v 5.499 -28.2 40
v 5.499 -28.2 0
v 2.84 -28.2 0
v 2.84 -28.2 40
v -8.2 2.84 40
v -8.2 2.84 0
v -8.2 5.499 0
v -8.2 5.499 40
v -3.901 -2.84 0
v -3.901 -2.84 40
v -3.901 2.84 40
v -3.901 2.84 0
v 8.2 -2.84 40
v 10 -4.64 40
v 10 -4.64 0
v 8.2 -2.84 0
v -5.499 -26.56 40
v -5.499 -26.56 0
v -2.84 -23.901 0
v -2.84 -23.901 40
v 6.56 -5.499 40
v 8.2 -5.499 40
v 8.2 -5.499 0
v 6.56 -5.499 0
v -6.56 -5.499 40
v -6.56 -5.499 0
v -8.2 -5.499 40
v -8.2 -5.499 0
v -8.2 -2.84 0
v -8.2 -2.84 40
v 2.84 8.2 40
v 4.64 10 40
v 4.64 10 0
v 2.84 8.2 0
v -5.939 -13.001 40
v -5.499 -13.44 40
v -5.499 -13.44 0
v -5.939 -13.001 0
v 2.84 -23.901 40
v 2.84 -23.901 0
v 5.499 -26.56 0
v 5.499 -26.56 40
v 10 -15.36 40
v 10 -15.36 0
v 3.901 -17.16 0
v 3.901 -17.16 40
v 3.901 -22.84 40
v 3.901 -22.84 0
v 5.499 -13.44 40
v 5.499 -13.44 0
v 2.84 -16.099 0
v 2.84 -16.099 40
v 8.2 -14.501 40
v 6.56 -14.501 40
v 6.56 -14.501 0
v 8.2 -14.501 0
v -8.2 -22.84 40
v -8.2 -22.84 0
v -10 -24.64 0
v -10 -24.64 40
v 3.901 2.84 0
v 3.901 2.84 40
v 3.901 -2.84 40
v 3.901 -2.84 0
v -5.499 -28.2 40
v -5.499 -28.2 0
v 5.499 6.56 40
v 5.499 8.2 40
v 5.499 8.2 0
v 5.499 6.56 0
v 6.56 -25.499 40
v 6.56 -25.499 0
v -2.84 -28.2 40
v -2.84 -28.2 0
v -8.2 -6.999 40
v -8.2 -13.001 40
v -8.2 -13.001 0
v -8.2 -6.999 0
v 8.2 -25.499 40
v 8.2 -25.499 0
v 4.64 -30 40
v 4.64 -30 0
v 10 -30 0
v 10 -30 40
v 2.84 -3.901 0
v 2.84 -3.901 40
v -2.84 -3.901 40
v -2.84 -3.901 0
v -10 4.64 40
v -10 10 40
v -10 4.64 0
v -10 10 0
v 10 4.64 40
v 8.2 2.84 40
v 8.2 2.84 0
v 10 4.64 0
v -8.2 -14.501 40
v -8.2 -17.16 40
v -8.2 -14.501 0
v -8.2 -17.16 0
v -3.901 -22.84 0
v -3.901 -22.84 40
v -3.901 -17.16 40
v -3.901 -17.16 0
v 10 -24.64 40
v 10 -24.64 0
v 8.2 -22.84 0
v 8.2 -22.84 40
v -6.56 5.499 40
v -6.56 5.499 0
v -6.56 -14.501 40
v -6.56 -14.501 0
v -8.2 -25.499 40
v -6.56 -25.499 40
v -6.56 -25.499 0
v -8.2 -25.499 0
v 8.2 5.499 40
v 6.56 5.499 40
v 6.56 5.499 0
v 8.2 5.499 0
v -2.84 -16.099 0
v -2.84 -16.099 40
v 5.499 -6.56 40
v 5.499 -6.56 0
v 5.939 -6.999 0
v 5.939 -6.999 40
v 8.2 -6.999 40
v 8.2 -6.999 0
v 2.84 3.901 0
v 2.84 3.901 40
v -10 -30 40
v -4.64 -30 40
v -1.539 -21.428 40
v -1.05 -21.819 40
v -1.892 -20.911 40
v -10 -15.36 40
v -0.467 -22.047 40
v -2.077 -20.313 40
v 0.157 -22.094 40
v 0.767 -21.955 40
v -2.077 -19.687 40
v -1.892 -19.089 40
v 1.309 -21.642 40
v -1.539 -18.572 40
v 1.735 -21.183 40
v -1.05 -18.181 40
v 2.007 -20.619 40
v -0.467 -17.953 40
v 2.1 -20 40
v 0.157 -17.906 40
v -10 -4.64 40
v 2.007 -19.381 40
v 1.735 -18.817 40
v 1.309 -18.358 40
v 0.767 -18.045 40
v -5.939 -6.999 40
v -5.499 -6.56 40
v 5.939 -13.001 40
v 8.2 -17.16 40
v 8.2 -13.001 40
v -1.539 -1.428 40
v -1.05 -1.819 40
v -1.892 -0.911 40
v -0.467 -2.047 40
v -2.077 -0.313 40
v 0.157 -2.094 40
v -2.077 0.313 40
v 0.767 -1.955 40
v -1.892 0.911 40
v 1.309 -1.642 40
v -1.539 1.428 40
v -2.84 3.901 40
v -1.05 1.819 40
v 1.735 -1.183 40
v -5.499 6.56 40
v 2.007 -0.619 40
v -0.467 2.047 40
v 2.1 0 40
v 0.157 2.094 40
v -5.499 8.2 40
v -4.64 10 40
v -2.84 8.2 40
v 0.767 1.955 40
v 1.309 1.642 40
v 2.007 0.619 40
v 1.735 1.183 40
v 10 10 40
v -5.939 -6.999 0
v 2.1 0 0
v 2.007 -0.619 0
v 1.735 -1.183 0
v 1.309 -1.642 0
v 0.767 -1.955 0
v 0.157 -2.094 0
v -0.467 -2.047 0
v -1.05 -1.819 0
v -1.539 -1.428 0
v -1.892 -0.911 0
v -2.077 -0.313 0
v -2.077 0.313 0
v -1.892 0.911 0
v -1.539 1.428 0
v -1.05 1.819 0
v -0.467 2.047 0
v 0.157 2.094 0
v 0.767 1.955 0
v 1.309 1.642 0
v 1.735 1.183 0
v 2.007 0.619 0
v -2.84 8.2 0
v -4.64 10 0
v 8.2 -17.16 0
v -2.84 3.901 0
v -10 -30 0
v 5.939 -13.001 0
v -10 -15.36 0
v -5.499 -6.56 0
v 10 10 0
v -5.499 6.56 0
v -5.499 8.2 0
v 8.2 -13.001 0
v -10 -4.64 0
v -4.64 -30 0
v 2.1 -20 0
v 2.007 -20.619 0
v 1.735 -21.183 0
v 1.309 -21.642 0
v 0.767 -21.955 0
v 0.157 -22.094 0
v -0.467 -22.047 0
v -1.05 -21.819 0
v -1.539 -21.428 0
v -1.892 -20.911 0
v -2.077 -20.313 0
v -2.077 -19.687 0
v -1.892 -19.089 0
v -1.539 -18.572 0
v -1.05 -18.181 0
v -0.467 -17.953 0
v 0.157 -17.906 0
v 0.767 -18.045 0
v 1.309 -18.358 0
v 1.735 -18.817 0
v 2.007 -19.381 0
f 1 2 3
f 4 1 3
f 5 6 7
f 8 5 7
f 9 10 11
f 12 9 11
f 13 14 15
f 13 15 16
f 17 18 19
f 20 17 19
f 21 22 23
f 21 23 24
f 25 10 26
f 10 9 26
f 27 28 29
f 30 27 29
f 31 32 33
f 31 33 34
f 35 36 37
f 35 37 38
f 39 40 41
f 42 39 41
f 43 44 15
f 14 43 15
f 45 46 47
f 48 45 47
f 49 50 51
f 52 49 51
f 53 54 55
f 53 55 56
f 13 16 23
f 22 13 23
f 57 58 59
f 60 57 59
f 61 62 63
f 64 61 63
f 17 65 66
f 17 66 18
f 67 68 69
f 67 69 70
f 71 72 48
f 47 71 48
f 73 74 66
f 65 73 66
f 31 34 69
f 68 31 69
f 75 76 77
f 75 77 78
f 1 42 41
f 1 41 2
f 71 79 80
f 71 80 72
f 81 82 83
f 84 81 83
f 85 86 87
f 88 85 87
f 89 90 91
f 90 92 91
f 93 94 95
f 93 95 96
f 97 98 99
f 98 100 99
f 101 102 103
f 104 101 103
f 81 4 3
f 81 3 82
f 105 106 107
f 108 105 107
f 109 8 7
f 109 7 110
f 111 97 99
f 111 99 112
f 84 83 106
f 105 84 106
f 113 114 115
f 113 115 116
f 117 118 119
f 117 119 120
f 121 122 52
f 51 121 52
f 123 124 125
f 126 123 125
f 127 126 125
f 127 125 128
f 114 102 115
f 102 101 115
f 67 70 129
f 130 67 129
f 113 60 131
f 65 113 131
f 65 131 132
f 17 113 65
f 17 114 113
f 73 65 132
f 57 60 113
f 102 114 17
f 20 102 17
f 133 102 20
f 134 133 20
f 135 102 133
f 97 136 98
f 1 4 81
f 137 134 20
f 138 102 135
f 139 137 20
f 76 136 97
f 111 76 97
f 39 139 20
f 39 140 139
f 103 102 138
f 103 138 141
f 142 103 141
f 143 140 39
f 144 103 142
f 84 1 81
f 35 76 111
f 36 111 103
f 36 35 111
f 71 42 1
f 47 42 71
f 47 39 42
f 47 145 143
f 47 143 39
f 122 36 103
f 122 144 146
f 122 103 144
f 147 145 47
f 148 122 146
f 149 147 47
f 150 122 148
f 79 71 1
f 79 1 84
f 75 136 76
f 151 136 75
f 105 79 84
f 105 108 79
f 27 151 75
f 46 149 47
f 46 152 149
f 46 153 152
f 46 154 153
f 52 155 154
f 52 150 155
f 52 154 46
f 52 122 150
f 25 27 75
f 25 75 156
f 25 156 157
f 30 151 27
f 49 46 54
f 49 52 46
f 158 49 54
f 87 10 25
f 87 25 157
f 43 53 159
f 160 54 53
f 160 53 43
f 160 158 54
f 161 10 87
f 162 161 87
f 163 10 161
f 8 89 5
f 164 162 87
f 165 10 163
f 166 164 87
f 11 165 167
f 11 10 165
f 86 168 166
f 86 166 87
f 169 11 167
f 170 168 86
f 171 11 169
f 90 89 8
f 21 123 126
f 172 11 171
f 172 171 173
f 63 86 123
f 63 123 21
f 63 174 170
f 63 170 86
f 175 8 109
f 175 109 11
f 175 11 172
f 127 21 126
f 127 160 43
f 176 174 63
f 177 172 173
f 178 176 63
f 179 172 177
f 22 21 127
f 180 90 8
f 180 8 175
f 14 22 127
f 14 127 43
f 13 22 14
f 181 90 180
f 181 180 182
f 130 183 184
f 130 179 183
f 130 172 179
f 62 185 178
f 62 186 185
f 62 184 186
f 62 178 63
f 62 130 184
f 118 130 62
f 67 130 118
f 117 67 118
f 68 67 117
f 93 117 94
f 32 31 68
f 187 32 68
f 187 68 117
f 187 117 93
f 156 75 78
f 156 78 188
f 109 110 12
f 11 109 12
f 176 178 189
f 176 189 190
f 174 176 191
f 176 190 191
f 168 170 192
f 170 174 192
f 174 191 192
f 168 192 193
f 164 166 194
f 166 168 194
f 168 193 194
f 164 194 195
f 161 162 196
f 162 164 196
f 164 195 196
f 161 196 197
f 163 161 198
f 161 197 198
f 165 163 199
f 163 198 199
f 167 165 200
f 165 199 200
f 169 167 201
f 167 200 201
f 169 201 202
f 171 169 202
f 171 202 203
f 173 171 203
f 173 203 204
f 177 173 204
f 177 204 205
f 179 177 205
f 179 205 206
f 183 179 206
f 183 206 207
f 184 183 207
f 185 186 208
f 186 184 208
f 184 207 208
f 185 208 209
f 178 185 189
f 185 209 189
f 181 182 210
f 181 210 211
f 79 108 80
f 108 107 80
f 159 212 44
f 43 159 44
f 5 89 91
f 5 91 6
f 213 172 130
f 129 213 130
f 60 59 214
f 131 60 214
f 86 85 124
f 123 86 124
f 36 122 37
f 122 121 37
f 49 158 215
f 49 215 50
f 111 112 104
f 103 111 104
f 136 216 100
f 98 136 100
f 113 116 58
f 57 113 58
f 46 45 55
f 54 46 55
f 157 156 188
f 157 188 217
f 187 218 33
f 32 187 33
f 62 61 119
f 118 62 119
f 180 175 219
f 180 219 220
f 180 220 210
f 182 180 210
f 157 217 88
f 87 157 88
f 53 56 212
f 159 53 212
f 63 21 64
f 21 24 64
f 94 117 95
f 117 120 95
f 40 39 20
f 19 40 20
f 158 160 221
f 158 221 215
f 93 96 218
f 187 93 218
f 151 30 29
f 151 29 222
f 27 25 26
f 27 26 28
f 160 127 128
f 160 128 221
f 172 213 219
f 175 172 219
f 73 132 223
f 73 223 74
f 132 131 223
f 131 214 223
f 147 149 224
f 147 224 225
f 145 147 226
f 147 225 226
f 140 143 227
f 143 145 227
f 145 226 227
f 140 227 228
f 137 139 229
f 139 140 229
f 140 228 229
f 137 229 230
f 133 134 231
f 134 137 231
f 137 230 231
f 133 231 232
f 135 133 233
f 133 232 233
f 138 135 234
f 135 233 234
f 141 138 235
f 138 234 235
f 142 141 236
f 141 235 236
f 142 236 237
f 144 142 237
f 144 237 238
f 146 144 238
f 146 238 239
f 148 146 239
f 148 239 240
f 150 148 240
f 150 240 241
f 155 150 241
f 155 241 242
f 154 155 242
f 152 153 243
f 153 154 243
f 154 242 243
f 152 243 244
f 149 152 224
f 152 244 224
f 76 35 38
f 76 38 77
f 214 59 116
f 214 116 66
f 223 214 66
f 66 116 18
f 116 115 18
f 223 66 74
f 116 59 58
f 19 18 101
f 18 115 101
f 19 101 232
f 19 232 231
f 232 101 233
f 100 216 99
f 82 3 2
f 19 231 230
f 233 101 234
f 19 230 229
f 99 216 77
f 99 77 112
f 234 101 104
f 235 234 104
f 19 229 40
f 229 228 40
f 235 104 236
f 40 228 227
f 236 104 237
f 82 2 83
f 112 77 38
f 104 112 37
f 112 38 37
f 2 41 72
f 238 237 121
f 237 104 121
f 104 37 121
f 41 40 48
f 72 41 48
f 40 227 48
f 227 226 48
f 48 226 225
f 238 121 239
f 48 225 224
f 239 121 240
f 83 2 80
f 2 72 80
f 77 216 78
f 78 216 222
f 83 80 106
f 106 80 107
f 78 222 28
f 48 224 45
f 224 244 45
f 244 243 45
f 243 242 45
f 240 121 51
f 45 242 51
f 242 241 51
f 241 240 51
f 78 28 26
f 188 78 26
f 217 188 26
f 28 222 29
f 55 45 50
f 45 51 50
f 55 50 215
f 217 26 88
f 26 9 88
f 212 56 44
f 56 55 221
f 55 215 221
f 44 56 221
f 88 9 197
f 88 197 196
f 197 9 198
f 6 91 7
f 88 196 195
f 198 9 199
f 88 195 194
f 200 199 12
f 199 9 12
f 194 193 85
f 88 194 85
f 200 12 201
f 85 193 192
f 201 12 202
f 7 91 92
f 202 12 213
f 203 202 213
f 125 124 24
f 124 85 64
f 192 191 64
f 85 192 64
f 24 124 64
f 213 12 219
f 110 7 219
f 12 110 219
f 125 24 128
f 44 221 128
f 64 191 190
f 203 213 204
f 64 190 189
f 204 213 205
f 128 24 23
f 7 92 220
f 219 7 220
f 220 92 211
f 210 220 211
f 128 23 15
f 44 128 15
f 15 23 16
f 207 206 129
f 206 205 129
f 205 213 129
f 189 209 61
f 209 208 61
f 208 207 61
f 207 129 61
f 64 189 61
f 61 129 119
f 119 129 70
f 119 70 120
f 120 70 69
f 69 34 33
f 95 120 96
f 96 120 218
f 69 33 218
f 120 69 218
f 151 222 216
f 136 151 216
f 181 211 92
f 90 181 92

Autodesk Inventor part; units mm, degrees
ref_plane "YZ Plane" through (0, 0, 0) normal (1, 0, 0) x (0, 1, 0)
ref_plane "XY Plane" through (0, 0, 0) normal (0, 0, 1) x (1, 0, 0)
sketch "Sketch1" plane through (0, 0, 0) normal (0, 0, 1) x (1, 0, 0)
  line L0 (-3.9007, 3.9007) -> (3.9007, 3.9007)
  line L1 (3.9007, 3.9007) -> (3.9007, -3.9007)
  line L2 (3.9007, -3.9007) -> (-3.9007, -3.9007)
  line L3 (-3.9007, -3.9007) -> (-3.9007, 3.9007)
  line L4 (0, 3.9007) -> (0, -3.9007) construction
  line L5 (-3.9007, 0) -> (3.9007, 0) construction
  circle A0 centre (0, 0) radius 2.1
  line L6 (0, 0) -> (-16.1173, 16.1173) construction
  line L7 (0, 0) -> (22.7933, 0) construction
  line L8 (-2.84, 3.9007) -> (-5.4993, 6.56)
  line L9 (-5.4993, 6.56) -> (-5.4993, 8.2)
  line L10 (-5.4993, 8.2) -> (-2.84, 8.2)
  line L11 (-2.84, 8.2) -> (-4.64, 10)
  line L12 (-4.64, 10) -> (-10, 10)
  line L13 (-10, 10) -> (-10, 4.64)
  line L14 (-10, 4.64) -> (-8.2, 2.84)
  line L15 (-8.2, 2.84) -> (-8.2, 5.4993)
  line L16 (-8.2, 5.4993) -> (-6.56, 5.4993)
  line L17 (-6.56, 5.4993) -> (-3.9007, 2.84)
  line L18 (-3.9007, 2.84) -> (-11.3102, 2.84) construction
  line L19 (-2.84, 3.9007) -> (-3.9007, 3.9007)
  line L20 (-3.9007, 2.84) -> (-3.9007, 3.9007)
  line L21 (-3.9007, -2.84) -> (-6.56, -5.4993)
  line L22 (-6.56, -5.4993) -> (-8.2, -5.4993)
  line L23 (-8.2, -5.4993) -> (-8.2, -2.84)
  line L24 (-8.2, -2.84) -> (-10, -4.64)
  line L25 (-10, -4.64) -> (-10, -10)
  line L26 (-10, -10) -> (-4.64, -10)
  line L27 (-4.64, -10) -> (-2.84, -8.2)
  line L28 (-2.84, -8.2) -> (-5.4993, -8.2)
  line L29 (-5.4993, -8.2) -> (-5.4993, -6.56)
  line L30 (-5.4993, -6.56) -> (-2.84, -3.9007)
  line L31 (-3.9007, -2.84) -> (-3.9007, -3.9007)
  line L32 (-2.84, -3.9007) -> (-3.9007, -3.9007)
  line L33 (2.84, -3.9007) -> (5.4993, -6.56)
  line L34 (5.4993, -6.56) -> (5.4993, -8.2)
  line L35 (5.4993, -8.2) -> (2.84, -8.2)
  line L36 (2.84, -8.2) -> (4.64, -10)
  line L37 (4.64, -10) -> (10, -10)
  line L38 (10, -10) -> (10, -4.64)
  line L39 (10, -4.64) -> (8.2, -2.84)
  line L40 (8.2, -2.84) -> (8.2, -5.4993)
  line L41 (8.2, -5.4993) -> (6.56, -5.4993)
  line L42 (6.56, -5.4993) -> (3.9007, -2.84)
  line L43 (2.84, -3.9007) -> (3.9007, -3.9007)
  line L44 (3.9007, -2.84) -> (3.9007, -3.9007)
  line L45 (3.9007, 2.84) -> (6.56, 5.4993)
  line L46 (6.56, 5.4993) -> (8.2, 5.4993)
  line L47 (8.2, 5.4993) -> (8.2, 2.84)
  line L48 (8.2, 2.84) -> (10, 4.64)
  line L49 (10, 4.64) -> (10, 10)
  line L50 (10, 10) -> (4.64, 10)
  line L51 (4.64, 10) -> (2.84, 8.2)
  line L52 (2.84, 8.2) -> (5.4993, 8.2)
  line L53 (5.4993, 8.2) -> (5.4993, 6.56)
  line L54 (5.4993, 6.56) -> (2.84, 3.9007)
  line L55 (3.9007, 2.84) -> (3.9007, 3.9007)
  line L56 (2.84, 3.9007) -> (3.9007, 3.9007)
  dimension "d7" = 4.2
  dimension "d8" = 135
  dimension "d9" = 1.5
  dimension "d10" = 1.64
  dimension "d11" = 1.8
  dimension "d12" = 2.84
  dimension "d13" = 10
  dimension "d16" = 360
extrude "Extrusion1" add sketch "Sketch1" along normal blind 40
pattern_linear "Rectangular Pattern1" count 2 spacing 20 along (0, -1, 0) of "Extrusion1"
sketch "Sketch2" plane through (0, 0, 40) normal (0, 0, 1) x (1, 0, 0)
  line L0 (8.2, -2.84) -> (8.2, -5.4993) projected
  line L1 (8.2, -5.4993) -> (6.56, -5.4993) projected
  line L2 (-6.56, -5.4993) -> (-8.2, -5.4993) projected
  line L3 (-8.2, -5.4993) -> (-8.2, -2.84) projected
  line L4 (-8.2, -14.5007) -> (-6.56, -14.5007) projected
  line L5 (6.56, -14.5007) -> (8.2, -14.5007) projected
  line L6 (5.4993, -11.8) -> (5.4993, -13.44) projected
  line L7 (5.4993, -13.44) -> (2.84, -16.0993) projected
  line L8 (-2.84, -16.0993) -> (-5.4993, -13.44) projected
  line L9 (-5.4993, -8.2) -> (-5.4993, -6.56) projected
  line L10 (-5.4993, -6.56) -> (-2.84, -3.9007) projected
  line L11 (2.84, -3.9007) -> (5.4993, -6.56) projected
  line L12 (2.84, -8.2) -> (4.64, -10) projected
  line L13 (-8.2, -6.9993) -> (-5.9387, -6.9993)
  line L14 (-5.9387, -6.9993) -> (-4.1231, -5.1837)
  line L15 (-4.1231, -5.1837) -> (4.1231, -5.1837)
  line L16 (4.1231, -5.1837) -> (5.9387, -6.9993)
  line L17 (5.9387, -6.9993) -> (8.2, -6.9993)
  line L18 (8.2, -6.9993) -> (8.2, -13.0007)
  line L19 (8.2, -13.0007) -> (5.9387, -13.0007)
  line L20 (5.9387, -13.0007) -> (4.2461, -14.6932)
  line L21 (4.2461, -14.6932) -> (-4.2461, -14.6932)
  line L22 (-4.2461, -14.6932) -> (-5.9387, -13.0007)
  line L23 (-5.9387, -13.0007) -> (-8.2, -13.0007)
  line L24 (-8.2, -13.0007) -> (-8.2, -6.9993)
  dimension "d23" = 1.5
  dimension "d24" = 1.5
  dimension "d25" = 1.5
  dimension "d26" = 1.5
extrude "Extrusion2" cut sketch "Sketch2" against normal up to next
ref_plane "Work Plane3" through (0, -20, 0) normal (0, 1, 0) x (-1, 0, 0)
ref_plane "Work Plane2" through (0, 0, 0) normal (0, 1, 0) x (-1, 0, 0)
ref_plane "Work Plane1" through (0, -10, 0) normal (0, 1, 0) x (-1, 0, 0)
equation "\"d24\" = d23"
equation "\"d25\" = d23"
equation "\"d26\" = d23"
properties part number "20x40x597mm" material "Aluminum 6061"
